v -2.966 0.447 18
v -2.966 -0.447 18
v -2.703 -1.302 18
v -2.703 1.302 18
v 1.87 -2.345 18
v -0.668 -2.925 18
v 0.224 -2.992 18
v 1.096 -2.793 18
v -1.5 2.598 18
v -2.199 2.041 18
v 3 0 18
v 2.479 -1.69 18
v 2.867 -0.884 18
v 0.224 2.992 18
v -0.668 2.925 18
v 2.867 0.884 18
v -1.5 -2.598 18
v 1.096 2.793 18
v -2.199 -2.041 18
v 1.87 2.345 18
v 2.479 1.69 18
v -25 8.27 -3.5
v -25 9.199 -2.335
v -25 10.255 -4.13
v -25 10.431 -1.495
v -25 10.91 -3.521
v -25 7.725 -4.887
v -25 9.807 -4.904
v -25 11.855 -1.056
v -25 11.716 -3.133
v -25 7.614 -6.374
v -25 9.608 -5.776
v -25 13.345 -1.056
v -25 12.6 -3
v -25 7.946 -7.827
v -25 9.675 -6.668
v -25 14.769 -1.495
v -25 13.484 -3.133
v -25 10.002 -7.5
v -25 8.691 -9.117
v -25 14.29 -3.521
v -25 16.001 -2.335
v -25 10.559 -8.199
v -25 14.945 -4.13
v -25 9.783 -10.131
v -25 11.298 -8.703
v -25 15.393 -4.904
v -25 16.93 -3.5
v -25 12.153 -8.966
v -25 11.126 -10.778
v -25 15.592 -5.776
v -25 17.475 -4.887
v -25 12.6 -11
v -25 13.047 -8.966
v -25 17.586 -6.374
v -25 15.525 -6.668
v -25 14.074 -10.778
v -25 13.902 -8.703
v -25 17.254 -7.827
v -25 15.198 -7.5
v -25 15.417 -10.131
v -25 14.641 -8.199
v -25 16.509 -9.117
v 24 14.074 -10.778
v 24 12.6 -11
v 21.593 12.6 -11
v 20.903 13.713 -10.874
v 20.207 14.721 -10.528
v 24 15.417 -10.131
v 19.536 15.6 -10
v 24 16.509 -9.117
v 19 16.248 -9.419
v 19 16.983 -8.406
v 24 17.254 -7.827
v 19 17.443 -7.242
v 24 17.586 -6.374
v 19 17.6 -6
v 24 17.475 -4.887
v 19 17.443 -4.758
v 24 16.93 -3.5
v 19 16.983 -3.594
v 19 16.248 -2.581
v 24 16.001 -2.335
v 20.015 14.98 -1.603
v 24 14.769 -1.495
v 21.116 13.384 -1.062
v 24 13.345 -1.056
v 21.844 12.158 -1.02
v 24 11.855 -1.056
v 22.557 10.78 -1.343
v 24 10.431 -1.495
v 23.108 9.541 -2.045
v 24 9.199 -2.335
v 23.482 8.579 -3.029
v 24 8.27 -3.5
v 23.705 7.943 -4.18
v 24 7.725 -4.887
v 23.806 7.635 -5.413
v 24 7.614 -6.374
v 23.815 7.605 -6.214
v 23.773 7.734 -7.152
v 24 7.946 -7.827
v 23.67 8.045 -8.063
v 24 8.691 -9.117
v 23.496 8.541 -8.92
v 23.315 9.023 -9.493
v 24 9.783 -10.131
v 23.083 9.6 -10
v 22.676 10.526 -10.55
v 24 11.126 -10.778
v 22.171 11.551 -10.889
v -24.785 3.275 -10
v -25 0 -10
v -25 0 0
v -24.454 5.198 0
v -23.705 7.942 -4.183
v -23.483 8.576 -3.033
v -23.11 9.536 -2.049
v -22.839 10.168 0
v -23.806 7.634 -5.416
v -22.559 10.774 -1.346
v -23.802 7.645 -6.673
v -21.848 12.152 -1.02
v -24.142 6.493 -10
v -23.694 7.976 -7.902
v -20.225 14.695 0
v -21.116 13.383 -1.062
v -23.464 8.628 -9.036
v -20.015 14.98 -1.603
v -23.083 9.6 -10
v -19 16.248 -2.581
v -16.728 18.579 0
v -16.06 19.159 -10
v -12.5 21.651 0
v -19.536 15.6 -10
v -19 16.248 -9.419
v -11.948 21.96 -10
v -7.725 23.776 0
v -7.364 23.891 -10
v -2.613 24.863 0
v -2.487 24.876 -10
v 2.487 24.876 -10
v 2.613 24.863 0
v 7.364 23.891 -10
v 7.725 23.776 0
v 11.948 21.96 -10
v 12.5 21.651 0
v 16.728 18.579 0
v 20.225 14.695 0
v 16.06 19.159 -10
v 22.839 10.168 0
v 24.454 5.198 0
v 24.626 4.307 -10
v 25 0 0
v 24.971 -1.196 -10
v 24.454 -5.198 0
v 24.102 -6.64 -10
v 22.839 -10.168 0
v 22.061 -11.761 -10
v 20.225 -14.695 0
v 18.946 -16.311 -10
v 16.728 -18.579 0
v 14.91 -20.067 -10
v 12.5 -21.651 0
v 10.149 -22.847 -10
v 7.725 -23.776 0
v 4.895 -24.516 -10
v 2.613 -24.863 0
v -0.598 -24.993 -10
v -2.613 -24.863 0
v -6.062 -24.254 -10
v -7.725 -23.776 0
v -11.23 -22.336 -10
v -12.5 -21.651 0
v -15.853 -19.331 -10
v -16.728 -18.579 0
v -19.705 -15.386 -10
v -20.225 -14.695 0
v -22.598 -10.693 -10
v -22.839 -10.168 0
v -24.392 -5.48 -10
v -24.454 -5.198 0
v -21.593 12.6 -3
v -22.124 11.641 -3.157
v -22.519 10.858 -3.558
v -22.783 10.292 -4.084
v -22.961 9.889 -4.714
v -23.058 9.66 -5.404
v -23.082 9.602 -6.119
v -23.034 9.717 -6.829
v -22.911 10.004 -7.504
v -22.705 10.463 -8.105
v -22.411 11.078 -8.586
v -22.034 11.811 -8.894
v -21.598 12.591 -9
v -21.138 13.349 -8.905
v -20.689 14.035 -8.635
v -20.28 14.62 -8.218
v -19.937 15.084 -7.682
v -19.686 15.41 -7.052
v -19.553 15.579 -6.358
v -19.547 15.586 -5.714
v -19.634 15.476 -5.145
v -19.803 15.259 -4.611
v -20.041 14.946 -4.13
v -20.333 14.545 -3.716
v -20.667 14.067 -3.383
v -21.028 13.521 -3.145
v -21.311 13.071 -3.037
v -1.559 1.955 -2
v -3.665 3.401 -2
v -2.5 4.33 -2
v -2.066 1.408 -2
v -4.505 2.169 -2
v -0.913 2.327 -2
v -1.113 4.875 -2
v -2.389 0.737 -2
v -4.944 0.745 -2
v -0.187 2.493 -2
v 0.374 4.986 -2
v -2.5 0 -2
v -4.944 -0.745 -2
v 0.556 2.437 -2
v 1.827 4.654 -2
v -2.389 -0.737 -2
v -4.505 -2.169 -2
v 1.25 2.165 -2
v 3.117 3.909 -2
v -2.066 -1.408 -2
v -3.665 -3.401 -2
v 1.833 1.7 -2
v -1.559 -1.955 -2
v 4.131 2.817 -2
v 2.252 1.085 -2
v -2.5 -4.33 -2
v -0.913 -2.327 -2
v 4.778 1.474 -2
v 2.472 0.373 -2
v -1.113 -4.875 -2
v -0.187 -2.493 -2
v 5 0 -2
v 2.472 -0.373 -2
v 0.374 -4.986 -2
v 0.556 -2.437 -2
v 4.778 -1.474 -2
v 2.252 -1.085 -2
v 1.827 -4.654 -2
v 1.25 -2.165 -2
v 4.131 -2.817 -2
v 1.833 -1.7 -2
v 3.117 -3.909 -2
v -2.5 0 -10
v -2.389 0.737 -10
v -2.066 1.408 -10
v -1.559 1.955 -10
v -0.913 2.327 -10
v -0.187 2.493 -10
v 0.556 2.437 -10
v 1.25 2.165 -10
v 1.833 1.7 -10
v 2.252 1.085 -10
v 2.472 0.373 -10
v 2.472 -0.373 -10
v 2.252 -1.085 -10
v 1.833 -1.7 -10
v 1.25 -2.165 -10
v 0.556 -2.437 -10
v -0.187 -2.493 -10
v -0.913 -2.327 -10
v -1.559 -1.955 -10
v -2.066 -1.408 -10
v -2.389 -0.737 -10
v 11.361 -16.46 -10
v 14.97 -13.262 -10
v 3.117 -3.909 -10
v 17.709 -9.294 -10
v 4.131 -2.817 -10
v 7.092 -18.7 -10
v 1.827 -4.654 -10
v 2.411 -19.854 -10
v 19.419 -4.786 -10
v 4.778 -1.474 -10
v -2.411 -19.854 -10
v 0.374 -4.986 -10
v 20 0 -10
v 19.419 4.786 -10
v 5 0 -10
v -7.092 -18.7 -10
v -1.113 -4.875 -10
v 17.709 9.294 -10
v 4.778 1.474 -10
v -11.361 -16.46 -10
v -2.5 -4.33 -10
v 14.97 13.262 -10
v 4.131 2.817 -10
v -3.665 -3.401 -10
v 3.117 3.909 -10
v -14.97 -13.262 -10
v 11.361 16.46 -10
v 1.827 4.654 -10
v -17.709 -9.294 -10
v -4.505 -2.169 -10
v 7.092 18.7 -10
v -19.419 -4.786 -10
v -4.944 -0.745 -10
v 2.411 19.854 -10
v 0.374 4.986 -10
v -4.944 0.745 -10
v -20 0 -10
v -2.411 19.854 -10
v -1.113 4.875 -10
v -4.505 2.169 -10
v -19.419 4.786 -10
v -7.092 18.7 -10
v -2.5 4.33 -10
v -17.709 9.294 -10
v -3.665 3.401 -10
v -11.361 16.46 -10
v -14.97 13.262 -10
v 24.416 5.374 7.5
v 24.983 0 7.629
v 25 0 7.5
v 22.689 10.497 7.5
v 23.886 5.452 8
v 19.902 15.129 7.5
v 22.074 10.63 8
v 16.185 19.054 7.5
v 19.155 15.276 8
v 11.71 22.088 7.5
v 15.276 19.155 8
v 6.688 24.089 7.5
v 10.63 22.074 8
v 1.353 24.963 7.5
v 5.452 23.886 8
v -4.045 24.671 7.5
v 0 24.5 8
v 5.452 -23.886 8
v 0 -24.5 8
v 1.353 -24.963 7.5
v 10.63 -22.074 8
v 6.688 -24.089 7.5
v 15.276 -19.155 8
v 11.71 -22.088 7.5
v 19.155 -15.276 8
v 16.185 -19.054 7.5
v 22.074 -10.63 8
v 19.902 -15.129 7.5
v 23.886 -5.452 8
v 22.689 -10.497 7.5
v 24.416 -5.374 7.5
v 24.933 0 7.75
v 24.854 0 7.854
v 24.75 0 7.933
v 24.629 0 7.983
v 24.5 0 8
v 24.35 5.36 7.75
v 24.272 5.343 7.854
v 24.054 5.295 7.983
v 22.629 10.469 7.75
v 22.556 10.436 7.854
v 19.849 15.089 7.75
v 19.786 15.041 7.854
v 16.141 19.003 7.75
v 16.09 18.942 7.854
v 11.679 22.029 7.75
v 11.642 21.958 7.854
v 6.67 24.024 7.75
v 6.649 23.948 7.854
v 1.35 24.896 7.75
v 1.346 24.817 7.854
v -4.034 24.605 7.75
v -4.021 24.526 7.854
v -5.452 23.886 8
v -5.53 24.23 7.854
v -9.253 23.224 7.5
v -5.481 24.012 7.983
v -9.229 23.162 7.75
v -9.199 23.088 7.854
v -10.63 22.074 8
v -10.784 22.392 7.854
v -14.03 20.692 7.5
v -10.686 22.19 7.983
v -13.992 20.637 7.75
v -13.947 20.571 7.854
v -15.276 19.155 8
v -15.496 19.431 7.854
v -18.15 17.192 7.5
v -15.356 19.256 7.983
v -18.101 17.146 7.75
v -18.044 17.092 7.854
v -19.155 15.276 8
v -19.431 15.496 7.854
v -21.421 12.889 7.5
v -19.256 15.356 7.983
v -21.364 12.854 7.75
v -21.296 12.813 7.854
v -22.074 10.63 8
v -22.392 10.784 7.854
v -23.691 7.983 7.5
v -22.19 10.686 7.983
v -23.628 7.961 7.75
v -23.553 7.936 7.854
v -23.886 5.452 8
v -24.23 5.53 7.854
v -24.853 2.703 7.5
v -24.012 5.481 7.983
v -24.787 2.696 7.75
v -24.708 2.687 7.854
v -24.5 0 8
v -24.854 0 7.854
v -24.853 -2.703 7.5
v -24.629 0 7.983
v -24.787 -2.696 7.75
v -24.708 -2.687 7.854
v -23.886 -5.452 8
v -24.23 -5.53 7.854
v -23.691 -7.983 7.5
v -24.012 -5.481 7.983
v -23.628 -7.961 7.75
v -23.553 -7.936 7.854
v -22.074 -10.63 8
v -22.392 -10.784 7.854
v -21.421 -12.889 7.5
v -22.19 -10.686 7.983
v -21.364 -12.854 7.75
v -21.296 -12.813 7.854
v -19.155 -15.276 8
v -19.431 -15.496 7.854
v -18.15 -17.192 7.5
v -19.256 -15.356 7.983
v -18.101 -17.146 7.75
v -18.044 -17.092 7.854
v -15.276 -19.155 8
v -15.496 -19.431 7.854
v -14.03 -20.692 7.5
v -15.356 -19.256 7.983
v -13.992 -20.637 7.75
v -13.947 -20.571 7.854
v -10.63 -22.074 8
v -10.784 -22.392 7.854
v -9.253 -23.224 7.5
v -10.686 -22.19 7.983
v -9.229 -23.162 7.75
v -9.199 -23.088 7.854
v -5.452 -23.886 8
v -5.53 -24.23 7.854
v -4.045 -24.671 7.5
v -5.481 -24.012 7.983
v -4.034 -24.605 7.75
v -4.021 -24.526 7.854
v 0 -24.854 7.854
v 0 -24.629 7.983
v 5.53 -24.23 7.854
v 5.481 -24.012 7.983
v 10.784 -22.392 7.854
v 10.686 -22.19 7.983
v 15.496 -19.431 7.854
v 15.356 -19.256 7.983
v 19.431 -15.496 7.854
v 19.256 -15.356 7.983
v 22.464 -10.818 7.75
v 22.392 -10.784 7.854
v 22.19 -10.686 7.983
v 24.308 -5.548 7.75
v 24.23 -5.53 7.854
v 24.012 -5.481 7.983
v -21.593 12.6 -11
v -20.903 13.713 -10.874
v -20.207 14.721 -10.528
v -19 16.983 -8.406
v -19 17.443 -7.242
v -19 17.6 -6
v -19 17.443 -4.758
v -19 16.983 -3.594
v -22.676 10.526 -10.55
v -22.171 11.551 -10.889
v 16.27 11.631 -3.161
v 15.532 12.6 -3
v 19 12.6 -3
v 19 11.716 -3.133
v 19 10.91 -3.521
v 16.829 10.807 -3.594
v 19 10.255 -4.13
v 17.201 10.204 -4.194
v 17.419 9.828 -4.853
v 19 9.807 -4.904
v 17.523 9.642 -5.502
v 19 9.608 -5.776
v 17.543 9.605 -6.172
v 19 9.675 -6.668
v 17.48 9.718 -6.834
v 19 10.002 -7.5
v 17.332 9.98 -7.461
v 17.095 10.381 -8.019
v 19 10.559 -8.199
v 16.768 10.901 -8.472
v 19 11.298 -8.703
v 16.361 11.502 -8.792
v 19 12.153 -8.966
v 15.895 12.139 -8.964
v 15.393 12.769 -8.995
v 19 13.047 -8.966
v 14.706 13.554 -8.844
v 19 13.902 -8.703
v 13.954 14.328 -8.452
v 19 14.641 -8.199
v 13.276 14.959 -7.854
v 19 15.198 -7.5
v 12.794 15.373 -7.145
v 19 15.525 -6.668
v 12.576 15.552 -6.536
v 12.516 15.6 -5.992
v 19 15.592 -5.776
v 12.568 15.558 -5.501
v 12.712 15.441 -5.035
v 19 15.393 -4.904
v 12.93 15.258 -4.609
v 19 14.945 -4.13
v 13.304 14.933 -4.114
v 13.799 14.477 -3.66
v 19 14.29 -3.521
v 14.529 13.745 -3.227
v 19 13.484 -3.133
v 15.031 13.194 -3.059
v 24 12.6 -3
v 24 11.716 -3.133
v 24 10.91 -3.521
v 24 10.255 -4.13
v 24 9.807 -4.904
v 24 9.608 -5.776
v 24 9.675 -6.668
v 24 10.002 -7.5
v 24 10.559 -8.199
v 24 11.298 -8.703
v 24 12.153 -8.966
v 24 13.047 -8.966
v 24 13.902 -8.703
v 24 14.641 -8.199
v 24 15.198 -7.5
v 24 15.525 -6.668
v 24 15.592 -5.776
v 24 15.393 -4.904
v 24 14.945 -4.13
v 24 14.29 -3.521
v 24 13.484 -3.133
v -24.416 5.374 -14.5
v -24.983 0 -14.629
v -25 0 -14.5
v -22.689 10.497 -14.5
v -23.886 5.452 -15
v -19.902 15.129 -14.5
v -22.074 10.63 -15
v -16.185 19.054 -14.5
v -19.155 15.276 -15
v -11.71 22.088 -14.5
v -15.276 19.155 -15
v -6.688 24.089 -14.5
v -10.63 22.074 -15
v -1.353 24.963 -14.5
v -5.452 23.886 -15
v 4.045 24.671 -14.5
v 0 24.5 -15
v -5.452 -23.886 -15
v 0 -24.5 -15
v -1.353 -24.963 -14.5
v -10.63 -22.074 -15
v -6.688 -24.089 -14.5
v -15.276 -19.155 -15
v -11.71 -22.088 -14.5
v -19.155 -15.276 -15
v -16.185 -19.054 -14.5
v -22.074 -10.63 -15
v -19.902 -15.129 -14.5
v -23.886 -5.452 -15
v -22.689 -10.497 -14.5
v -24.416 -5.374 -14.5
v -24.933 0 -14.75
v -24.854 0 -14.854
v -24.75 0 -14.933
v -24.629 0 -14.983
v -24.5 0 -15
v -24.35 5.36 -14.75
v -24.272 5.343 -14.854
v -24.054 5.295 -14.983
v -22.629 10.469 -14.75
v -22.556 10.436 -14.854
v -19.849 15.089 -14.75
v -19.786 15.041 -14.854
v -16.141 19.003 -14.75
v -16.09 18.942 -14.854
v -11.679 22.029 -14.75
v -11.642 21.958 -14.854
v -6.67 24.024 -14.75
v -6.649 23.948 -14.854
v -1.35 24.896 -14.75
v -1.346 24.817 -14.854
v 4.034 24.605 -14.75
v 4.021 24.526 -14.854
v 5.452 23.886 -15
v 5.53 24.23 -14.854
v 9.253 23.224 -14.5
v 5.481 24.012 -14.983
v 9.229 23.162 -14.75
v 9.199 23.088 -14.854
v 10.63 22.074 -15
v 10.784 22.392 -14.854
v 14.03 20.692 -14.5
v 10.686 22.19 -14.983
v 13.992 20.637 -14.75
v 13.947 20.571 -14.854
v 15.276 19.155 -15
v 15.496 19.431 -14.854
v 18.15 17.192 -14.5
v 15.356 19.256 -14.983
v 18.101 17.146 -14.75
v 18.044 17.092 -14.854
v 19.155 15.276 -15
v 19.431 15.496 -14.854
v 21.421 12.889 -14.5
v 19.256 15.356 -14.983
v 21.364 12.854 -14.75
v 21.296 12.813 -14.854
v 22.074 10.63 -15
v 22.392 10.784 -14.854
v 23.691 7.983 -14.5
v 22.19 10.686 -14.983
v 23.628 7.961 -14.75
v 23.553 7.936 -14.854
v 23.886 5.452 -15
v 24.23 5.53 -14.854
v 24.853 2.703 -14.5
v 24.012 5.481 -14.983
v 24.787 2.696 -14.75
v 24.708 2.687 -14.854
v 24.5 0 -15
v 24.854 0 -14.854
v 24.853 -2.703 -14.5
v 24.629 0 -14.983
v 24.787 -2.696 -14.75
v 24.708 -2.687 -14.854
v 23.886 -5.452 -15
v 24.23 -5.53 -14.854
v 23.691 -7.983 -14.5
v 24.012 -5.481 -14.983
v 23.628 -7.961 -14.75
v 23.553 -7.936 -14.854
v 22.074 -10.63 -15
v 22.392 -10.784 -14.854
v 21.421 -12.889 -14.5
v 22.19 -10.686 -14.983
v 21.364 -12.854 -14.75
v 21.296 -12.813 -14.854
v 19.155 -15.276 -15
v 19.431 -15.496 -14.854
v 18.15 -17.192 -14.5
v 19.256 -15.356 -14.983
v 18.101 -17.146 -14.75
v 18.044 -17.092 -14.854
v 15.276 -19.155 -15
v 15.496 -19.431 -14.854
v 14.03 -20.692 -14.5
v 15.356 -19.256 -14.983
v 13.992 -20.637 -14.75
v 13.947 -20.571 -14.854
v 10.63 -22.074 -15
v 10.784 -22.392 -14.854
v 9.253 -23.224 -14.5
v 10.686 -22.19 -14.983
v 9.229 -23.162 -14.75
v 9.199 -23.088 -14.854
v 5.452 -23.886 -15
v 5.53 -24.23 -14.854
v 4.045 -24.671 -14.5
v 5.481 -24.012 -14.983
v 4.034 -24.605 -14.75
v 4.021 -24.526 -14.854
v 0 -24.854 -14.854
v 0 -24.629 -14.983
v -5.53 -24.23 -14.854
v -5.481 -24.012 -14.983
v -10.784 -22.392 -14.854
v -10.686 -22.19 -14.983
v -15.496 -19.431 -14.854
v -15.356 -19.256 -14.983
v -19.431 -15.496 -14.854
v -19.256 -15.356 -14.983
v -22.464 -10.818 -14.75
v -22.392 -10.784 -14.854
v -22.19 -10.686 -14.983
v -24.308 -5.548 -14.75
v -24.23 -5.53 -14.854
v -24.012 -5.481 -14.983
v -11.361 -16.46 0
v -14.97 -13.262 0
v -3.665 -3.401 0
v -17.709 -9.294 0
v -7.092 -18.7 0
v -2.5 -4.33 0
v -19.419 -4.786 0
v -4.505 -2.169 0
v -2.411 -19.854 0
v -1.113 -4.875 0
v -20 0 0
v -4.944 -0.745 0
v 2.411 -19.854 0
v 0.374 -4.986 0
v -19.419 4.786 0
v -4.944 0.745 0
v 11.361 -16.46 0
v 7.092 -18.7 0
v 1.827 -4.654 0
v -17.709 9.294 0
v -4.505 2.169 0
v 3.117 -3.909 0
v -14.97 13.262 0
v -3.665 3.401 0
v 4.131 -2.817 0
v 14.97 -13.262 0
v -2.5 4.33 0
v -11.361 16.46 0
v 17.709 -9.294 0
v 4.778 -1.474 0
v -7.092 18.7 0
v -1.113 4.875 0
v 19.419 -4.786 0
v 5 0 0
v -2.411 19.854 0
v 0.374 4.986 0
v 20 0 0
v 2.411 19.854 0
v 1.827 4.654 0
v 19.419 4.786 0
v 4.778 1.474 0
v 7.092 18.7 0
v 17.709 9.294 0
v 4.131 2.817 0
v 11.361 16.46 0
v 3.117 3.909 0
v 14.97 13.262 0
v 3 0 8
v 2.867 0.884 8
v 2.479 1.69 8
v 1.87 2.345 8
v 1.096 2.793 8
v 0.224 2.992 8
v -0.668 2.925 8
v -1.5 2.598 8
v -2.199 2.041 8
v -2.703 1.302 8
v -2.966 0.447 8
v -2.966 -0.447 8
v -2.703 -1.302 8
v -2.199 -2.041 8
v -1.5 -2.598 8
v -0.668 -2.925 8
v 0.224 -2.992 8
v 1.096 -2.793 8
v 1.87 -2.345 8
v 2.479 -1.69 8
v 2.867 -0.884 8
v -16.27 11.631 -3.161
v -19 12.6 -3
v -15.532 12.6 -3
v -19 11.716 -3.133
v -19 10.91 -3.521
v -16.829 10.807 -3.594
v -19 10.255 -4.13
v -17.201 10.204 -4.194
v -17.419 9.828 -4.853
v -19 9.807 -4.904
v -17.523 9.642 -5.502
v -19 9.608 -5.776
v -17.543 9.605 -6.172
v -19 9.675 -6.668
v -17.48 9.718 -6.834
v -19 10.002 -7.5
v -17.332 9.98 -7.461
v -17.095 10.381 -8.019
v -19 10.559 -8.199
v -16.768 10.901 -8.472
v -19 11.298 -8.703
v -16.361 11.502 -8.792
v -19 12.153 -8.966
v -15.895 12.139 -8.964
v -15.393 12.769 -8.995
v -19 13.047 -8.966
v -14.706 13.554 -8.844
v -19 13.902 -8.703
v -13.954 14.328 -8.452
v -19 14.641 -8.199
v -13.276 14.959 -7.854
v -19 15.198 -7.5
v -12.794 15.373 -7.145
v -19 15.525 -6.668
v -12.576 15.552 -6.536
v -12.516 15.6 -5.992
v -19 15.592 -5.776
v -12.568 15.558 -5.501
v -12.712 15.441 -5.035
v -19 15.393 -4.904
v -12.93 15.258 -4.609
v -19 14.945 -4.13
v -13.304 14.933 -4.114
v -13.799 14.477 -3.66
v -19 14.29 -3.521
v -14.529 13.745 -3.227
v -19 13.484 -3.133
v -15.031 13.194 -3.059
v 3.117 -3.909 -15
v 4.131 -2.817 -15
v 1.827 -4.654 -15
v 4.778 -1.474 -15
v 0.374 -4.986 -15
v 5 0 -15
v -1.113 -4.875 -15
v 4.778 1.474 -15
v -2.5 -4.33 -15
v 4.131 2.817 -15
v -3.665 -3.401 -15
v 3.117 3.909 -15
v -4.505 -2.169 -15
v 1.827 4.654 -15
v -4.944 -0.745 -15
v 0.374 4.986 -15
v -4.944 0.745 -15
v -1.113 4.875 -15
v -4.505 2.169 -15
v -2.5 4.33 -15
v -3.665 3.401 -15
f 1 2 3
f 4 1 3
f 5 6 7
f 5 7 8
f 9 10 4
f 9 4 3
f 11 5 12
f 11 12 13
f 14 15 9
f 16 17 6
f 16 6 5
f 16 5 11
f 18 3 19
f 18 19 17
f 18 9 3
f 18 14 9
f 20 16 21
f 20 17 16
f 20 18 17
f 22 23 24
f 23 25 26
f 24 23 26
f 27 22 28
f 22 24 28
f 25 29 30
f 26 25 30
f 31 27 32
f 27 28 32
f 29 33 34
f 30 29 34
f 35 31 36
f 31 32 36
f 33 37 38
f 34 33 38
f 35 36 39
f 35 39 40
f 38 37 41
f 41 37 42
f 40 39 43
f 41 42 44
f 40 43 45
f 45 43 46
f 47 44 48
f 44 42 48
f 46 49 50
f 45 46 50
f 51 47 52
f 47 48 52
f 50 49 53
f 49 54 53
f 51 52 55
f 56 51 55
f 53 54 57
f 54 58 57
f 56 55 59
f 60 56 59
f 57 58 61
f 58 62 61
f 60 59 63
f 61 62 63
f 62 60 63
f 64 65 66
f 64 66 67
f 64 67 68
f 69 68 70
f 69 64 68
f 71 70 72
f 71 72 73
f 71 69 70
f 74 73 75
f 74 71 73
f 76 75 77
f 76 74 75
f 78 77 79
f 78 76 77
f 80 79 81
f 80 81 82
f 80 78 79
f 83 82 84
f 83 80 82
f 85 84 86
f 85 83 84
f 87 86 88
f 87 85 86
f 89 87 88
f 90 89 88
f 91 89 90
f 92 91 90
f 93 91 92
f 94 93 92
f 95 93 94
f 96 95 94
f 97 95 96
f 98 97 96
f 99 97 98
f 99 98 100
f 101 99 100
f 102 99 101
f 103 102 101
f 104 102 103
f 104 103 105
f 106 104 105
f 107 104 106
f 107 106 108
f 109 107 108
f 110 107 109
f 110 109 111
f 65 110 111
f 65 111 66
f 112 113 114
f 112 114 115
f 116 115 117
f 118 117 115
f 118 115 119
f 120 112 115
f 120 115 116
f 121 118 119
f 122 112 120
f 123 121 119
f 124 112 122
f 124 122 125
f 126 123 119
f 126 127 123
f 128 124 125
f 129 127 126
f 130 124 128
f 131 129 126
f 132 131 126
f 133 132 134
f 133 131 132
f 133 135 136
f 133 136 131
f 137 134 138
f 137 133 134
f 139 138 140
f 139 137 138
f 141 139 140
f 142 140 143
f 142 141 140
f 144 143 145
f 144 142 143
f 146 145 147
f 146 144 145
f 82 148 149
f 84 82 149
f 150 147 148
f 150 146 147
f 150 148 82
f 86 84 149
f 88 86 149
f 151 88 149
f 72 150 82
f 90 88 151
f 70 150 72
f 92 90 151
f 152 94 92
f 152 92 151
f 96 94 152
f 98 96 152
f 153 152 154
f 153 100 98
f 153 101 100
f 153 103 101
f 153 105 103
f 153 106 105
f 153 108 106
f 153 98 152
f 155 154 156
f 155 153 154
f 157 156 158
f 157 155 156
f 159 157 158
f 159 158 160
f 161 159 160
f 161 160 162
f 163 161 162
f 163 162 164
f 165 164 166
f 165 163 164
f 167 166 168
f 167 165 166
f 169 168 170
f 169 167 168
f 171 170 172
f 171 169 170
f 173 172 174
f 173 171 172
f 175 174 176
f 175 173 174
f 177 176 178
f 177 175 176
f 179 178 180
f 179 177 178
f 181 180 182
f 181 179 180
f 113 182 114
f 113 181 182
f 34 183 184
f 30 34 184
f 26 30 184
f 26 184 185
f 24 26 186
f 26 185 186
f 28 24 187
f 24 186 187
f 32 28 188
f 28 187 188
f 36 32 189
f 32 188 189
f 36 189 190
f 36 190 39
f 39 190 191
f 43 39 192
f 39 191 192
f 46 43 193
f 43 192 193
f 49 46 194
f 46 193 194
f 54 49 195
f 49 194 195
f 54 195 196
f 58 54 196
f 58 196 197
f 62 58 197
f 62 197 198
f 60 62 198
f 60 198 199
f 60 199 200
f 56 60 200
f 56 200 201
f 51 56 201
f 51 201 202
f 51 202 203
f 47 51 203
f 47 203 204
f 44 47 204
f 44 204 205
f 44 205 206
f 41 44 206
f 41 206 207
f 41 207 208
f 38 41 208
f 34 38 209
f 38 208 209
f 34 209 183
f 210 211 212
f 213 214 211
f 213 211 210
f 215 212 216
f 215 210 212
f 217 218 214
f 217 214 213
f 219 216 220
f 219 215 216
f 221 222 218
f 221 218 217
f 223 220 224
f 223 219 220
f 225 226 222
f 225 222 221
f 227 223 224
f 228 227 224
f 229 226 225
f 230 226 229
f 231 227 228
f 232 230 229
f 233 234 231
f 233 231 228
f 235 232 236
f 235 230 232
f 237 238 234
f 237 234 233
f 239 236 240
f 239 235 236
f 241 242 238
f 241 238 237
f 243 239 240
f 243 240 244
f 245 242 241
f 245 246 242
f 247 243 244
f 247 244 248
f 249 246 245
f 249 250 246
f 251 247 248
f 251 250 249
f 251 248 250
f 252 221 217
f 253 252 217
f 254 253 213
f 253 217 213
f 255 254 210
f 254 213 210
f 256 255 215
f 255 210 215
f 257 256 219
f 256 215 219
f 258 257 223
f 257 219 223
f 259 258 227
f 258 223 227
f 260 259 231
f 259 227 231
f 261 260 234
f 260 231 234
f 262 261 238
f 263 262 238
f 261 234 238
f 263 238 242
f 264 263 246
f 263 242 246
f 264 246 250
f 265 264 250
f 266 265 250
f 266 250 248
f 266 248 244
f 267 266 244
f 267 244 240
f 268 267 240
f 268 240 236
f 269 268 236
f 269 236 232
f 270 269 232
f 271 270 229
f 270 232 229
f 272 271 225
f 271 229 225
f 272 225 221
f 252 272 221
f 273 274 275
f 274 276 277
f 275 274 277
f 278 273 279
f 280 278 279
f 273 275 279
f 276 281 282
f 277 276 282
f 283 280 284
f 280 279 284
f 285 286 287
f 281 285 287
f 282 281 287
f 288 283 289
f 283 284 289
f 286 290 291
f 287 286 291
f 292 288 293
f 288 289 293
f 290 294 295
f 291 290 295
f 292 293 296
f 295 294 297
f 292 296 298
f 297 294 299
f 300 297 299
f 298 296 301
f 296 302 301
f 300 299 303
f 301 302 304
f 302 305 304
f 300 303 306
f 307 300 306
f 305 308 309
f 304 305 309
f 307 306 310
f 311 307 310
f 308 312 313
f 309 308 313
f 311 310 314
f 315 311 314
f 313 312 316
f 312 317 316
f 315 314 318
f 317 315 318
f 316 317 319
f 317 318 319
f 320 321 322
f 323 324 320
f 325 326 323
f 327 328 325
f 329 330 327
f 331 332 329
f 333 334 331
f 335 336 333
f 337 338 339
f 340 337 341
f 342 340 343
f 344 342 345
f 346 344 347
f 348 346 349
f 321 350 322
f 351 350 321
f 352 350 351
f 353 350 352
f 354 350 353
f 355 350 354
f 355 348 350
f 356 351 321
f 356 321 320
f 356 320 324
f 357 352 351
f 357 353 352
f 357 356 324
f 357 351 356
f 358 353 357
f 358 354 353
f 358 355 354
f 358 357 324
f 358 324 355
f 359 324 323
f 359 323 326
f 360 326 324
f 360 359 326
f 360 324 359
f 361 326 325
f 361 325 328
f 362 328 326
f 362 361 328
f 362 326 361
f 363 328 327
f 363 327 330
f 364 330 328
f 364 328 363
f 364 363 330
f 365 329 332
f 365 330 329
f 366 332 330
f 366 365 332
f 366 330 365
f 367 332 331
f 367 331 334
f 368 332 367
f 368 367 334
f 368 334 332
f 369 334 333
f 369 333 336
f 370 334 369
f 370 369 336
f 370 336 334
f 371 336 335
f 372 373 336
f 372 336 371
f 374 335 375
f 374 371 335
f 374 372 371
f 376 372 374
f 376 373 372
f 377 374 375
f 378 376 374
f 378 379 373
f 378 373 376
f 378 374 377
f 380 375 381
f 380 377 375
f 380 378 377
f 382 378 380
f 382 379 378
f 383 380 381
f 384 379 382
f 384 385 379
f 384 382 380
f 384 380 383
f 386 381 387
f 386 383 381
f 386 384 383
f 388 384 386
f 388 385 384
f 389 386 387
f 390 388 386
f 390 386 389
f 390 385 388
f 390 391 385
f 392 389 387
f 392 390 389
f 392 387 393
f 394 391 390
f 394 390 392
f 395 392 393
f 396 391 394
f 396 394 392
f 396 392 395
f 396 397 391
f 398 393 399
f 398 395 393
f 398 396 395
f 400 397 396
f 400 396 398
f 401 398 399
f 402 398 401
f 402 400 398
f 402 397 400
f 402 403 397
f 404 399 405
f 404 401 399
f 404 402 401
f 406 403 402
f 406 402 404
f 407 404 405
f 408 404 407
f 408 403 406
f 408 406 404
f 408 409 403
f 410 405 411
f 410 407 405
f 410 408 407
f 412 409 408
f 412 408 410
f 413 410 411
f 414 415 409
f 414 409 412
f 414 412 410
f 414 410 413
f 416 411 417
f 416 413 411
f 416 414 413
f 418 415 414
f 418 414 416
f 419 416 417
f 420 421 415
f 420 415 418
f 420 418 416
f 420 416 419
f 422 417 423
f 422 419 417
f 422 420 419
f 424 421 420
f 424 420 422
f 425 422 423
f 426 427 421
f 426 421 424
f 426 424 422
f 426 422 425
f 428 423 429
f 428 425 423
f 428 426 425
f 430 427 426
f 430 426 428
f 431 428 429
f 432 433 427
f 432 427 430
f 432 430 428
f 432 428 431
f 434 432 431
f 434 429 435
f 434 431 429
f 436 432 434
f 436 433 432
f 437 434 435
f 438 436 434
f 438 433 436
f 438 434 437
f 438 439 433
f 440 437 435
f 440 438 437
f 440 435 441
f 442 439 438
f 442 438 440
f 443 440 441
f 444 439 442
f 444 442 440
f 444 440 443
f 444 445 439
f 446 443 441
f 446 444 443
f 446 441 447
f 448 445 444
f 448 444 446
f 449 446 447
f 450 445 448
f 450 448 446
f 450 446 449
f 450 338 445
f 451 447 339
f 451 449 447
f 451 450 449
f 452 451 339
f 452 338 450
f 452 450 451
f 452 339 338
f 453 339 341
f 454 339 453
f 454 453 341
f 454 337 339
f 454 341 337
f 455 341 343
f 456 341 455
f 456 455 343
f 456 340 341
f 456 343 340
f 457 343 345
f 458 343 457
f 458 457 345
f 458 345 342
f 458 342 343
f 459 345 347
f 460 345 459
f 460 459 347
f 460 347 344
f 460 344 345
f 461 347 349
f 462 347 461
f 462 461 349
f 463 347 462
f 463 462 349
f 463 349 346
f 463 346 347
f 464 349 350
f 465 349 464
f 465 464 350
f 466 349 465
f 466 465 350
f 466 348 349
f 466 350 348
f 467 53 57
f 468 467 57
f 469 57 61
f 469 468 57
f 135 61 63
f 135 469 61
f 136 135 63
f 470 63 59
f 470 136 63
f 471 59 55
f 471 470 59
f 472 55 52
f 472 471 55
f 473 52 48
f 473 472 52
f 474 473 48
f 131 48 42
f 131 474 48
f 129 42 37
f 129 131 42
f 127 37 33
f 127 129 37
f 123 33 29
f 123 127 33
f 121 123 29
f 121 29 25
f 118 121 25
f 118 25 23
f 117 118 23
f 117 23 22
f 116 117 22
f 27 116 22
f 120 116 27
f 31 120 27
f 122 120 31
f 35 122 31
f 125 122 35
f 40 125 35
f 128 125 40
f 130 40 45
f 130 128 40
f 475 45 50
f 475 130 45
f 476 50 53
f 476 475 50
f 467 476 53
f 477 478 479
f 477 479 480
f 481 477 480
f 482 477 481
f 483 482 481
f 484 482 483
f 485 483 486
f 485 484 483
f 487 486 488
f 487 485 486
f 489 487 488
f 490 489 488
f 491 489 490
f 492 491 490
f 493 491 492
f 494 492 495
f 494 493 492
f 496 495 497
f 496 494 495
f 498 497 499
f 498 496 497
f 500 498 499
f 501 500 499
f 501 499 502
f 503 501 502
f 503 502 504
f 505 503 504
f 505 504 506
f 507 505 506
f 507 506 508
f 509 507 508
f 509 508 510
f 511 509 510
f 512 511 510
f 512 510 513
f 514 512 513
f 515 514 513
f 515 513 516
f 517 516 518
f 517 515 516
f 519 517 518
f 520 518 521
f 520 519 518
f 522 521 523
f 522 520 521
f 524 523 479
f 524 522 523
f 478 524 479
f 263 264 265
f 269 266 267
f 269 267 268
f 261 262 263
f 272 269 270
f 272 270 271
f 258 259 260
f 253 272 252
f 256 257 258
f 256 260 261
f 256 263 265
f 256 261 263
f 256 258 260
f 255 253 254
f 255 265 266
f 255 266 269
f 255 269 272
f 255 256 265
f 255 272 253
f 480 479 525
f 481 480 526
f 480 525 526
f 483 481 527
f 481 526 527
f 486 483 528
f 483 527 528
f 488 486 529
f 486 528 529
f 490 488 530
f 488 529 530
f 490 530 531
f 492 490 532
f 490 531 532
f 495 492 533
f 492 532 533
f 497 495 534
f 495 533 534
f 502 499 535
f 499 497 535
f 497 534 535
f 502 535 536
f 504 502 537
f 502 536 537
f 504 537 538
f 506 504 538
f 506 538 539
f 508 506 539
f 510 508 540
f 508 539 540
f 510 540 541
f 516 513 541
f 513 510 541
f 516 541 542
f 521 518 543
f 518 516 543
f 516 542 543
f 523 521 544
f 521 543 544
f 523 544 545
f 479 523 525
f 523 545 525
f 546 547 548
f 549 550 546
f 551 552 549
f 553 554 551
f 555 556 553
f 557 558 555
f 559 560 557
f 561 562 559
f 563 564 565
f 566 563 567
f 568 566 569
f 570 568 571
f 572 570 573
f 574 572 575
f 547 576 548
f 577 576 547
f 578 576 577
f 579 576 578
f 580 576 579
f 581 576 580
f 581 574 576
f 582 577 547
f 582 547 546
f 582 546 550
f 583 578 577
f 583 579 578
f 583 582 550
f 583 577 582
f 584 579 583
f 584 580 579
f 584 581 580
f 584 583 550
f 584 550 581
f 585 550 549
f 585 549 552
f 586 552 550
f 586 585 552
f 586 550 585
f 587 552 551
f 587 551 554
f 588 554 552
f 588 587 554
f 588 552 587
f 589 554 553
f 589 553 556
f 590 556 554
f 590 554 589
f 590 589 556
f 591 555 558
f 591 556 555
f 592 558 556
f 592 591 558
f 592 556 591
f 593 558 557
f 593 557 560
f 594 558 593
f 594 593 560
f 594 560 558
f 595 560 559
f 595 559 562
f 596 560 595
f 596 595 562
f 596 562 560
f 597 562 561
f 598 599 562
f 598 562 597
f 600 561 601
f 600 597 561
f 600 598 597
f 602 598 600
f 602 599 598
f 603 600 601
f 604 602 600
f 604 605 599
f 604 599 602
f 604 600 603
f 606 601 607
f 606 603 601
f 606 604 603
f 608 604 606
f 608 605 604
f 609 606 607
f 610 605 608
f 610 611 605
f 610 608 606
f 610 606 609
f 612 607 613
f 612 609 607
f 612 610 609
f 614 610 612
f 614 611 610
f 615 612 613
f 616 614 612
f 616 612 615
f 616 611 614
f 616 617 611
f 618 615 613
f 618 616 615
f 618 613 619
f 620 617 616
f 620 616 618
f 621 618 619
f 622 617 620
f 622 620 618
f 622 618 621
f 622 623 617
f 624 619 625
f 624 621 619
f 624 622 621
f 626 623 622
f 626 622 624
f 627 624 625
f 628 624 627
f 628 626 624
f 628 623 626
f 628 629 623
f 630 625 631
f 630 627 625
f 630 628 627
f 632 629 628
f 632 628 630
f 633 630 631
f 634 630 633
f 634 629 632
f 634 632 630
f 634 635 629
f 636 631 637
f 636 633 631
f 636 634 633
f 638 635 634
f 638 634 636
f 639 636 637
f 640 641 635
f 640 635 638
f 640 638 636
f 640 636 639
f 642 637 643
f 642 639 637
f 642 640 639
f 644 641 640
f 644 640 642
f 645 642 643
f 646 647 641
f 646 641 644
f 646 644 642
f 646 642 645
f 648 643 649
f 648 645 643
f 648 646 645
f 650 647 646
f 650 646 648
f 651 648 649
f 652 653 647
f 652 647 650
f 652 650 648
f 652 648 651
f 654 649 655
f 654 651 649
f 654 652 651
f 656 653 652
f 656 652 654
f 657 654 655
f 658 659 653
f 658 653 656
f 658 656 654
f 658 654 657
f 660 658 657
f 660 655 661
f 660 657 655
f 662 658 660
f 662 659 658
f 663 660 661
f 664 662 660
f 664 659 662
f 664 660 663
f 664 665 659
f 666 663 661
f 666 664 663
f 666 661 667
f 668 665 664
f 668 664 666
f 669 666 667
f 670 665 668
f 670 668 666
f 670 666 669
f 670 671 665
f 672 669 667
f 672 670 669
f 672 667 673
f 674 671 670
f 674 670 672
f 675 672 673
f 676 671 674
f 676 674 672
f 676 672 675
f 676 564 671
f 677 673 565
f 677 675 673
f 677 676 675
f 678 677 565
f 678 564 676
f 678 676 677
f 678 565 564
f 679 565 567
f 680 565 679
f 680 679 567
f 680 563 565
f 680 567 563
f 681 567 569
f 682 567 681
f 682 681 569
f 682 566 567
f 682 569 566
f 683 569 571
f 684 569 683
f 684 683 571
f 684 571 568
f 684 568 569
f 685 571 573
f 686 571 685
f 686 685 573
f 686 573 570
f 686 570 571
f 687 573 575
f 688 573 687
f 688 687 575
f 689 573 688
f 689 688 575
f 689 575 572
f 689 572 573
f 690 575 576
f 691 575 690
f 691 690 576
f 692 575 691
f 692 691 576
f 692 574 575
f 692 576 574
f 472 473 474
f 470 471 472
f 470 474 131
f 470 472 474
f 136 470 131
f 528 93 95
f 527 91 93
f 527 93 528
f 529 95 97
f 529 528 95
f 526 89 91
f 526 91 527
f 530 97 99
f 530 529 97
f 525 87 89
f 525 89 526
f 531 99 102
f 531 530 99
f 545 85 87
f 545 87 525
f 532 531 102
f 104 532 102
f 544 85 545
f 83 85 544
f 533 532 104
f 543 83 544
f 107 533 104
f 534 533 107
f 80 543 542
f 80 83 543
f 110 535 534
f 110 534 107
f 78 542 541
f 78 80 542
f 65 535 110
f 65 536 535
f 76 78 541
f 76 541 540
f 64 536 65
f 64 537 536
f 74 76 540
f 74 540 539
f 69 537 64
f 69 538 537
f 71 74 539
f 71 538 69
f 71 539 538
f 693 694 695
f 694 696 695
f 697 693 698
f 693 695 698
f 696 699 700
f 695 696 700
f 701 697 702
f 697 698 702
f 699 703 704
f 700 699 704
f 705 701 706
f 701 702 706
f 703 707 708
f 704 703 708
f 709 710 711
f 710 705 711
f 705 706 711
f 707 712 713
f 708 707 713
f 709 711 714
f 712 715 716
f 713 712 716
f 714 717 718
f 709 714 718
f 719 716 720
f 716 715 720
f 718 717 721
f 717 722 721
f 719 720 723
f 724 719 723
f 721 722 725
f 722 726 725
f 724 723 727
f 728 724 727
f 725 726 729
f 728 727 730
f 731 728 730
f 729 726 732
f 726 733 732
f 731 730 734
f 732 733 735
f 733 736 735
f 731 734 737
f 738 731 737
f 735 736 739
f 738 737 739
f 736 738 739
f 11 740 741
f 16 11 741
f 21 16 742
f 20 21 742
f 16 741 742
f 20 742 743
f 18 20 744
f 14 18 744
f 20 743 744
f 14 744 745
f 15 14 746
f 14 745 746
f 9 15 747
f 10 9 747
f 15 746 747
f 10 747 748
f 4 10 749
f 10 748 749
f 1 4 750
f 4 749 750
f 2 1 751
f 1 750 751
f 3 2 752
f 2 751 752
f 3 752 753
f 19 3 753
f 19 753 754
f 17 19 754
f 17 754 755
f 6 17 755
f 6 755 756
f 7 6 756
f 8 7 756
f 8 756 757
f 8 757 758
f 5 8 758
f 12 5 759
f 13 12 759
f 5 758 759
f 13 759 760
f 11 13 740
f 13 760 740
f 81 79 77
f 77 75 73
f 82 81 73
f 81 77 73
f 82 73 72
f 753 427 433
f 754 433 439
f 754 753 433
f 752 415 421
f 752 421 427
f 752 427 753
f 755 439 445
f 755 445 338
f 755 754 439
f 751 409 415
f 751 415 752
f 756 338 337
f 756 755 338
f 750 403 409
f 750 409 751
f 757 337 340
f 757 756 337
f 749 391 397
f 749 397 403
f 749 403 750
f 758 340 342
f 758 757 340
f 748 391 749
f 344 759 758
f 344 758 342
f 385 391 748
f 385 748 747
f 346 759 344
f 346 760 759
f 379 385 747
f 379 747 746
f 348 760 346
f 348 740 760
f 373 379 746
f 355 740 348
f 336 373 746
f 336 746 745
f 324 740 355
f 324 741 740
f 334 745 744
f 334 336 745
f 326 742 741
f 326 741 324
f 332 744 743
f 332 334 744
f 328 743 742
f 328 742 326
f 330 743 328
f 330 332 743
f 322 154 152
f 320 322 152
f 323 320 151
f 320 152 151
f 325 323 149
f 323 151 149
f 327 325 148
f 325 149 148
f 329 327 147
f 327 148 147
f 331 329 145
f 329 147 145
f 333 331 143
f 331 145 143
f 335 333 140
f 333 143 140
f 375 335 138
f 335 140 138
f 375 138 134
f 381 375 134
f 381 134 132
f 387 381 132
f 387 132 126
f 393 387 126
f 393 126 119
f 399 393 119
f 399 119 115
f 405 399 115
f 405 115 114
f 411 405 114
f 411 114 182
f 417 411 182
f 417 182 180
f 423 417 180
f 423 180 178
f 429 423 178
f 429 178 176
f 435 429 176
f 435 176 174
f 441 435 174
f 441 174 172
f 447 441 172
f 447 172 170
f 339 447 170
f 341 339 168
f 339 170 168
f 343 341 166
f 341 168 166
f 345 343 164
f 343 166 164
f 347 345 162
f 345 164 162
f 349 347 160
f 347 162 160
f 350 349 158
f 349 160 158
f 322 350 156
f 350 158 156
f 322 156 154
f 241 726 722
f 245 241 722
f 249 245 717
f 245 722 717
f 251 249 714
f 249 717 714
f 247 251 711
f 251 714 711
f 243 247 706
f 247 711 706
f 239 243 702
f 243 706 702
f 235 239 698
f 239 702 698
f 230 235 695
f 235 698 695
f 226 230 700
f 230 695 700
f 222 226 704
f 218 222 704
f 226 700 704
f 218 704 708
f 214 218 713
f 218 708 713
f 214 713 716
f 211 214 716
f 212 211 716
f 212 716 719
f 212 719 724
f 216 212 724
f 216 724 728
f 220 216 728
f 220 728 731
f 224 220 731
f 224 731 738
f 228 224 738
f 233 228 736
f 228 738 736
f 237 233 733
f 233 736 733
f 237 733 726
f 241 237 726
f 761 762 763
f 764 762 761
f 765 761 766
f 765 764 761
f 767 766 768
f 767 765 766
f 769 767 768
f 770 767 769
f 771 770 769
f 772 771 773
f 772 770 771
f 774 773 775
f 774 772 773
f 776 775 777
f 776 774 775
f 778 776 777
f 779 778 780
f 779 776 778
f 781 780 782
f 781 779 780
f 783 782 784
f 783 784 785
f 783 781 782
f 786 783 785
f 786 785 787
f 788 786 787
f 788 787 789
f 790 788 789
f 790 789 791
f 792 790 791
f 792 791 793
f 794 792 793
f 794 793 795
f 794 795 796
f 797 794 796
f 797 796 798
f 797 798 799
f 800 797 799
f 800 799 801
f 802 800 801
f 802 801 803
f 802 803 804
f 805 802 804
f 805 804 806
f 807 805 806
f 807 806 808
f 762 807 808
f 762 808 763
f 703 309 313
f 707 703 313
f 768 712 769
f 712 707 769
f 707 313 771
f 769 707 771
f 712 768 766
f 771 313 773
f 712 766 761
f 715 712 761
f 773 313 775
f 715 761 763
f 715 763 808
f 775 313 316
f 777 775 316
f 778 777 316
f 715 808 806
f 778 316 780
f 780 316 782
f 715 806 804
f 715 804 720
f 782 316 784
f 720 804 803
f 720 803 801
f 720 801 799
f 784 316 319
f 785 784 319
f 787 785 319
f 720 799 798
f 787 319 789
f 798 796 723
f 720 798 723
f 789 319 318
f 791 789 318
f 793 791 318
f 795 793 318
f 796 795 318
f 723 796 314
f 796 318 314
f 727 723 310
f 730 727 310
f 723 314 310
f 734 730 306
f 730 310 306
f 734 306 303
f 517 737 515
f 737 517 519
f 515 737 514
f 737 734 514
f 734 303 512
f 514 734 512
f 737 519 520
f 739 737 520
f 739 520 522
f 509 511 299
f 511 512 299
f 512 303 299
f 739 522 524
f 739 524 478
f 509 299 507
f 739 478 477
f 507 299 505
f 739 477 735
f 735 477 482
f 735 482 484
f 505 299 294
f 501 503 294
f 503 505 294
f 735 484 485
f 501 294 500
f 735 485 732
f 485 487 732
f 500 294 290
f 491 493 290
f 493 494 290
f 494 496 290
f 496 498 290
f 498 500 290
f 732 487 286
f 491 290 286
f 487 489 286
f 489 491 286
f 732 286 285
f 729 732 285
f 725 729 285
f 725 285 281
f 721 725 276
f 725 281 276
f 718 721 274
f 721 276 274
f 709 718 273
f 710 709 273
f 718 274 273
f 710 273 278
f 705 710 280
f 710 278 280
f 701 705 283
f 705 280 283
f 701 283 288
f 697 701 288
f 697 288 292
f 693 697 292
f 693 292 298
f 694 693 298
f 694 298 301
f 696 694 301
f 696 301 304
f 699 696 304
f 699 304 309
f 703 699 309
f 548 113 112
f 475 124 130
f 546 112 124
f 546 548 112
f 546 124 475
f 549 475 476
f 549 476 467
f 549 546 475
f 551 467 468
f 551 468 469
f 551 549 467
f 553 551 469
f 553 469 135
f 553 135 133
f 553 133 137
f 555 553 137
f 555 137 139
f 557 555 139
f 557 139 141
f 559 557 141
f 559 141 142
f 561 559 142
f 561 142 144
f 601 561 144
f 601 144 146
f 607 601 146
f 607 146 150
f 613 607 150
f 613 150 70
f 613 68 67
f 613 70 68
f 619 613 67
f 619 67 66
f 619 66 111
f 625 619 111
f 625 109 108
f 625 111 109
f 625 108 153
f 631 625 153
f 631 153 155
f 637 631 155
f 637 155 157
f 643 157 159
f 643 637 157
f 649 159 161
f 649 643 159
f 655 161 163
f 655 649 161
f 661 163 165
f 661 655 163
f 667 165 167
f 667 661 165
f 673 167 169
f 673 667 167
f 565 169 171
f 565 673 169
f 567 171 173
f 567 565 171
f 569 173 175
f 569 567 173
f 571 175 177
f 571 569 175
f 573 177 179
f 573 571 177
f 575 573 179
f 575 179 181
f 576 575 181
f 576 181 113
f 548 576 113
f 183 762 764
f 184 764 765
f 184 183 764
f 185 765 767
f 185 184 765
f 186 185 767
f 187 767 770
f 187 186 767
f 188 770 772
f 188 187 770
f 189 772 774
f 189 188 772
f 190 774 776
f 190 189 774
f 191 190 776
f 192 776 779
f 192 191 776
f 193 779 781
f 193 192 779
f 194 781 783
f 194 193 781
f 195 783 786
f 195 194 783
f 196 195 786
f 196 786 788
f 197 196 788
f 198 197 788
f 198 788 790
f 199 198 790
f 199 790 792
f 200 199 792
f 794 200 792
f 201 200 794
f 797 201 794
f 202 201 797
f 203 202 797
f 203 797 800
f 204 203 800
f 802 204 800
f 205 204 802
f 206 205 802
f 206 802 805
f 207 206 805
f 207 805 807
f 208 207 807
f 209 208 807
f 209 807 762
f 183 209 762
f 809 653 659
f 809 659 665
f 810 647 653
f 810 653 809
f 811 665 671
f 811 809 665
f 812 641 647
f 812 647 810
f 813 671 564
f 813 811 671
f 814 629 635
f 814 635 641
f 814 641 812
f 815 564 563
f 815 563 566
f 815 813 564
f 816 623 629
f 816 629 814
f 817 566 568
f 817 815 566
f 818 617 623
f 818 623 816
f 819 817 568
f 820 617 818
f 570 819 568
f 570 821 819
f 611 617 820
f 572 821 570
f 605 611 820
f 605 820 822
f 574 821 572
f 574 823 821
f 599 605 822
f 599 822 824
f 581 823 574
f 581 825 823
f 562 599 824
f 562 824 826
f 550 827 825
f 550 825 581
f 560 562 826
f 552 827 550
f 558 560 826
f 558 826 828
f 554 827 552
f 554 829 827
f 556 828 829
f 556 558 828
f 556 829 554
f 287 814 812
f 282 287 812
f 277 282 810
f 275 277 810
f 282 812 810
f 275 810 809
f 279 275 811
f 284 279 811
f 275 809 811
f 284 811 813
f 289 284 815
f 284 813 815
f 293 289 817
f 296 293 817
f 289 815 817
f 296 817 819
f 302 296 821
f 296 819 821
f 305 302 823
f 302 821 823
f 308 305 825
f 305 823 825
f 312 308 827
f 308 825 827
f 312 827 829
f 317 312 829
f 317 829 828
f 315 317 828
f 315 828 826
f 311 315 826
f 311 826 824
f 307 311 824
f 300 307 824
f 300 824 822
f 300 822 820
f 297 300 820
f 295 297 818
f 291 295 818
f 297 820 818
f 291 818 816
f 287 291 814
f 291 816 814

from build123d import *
from build123d.topology import SkipClean

# Parameters (mm, degrees)
SKETCH_1_R               = 25
EXTRUDE_1_DEPTH          = 8
SKETCH_2_R               = 3
EXTRUDE_2_DEPTH          = 10
EXTRUDE_START            = 10
SKETCH_3_R               = 25
SKETCH_3_R_2             = 20
EXTRUDE_3_DEPTH          = 10
SKETCH_4_R               = 5
EXTRUDE_4_DEPTH          = 2
SKETCH_5_R               = 2.5
EXTRUDE_5_DEPTH          = 8
EXTRUDE_START_2          = 5
SKETCH_6_R               = 25
SKETCH_6_R_2             = 5
EXTRUDE_6_DEPTH          = 5
CUT_EXTRUDE_1_DEPTH      = 40.67366885
CUT_EXTRUDE_1_DEPTH_BACK = 40.67366885
SKETCH_8_R               = 3
SKETCH_9_R               = 5
SKETCH_9_R_2             = 3
EXTRUDE_7_DEPTH          = 6
SKETCH_10_R              = 5
EXTRUDE_8_DEPTH          = 5
SKETCH_11_R              = 3
CUT_EXTRUDE_2_DEPTH      = 5
FILLET_1_R               = 0.5


with BuildPart() as part:
    # 草图1 → 凸台-拉伸1 (new body)
    with BuildSketch(Plane.XY):
        Circle(SKETCH_1_R)
    extrude(amount=EXTRUDE_1_DEPTH)

    # 草图2 → 凸台-拉伸2 (add)
    with BuildSketch(Plane.XY.offset(8)):
        Circle(SKETCH_2_R)
    extrude(amount=EXTRUDE_2_DEPTH)

    # 草图3 → 凸台-拉伸3 (add)
    with BuildSketch(Plane(origin=(0, 0, 0), x_dir=(-1, 0, 0), z_dir=(0, 0, -1)).offset(EXTRUDE_START)):
        Circle(SKETCH_3_R)
        Circle(SKETCH_3_R_2, mode=Mode.SUBTRACT)
    extrude(amount=-EXTRUDE_3_DEPTH)

    # 草图4 → 凸台-拉伸4 (add)
    with BuildSketch(Plane(origin=(0, 0, 0), x_dir=(-1, 0, 0), z_dir=(0, 0, -1))):
        with Locations(Location((0, 0, 0), (0, 0, 180))):
            Circle(SKETCH_4_R)
    extrude(amount=EXTRUDE_4_DEPTH)

    # 草图5 → 凸台-拉伸5 (add)
    with BuildSketch(Plane(origin=(0, 0, -2), x_dir=(-1, 0, 0), z_dir=(0, 0, -1))):
        Circle(SKETCH_5_R)
    extrude(amount=EXTRUDE_5_DEPTH)

    # 草图6 → 凸台-拉伸6 (add)
    with BuildSketch(Plane(origin=(0, 0, -10), x_dir=(-1, 0, 0), z_dir=(0, 0, -1)).offset(EXTRUDE_START_2)):
        Circle(SKETCH_6_R)
        with Locations(Location((0, 0, 0), (0, 0, 180))):
            Circle(SKETCH_6_R_2, mode=Mode.SUBTRACT)
    extrude(amount=-EXTRUDE_6_DEPTH)

    # 草图8 → 切除-拉伸1 (cut, two sides: drawn at the far end of the back side and taken through both)
    with BuildSketch(Plane(origin=(0, 0, 0), x_dir=(0, 0, -1), z_dir=(1, 0, 0)).offset(-CUT_EXTRUDE_1_DEPTH_BACK)):
        with Locations(Location((6, 12.6, 0), (0, 0, 180))):
            Circle(SKETCH_8_R)
    extrude(amount=CUT_EXTRUDE_1_DEPTH + CUT_EXTRUDE_1_DEPTH_BACK, mode=Mode.SUBTRACT)

    # 草图9 → 凸台-拉伸7 (add, through all)
    with SkipClean():  # the faces are left unmerged after this step: merging them gives an invalid solid
        with BuildSketch(Plane(origin=(-19, 0, 0), x_dir=(0, 0, -1), z_dir=(1, 0, 0))):
            with Locations((6, 12.6)):
                Circle(SKETCH_9_R)
            with Locations(Location((6, 12.6, 0), (0, 0, 180))):
                Circle(SKETCH_9_R_2, mode=Mode.SUBTRACT)
        extrude(amount=-EXTRUDE_7_DEPTH)

    # 草图10 → 凸台-拉伸8 (add)
    with BuildSketch(Plane(origin=(19, 0, 0), x_dir=(0, 0, -1), z_dir=(1, 0, 0)).offset(EXTRUDE_START_2)):
        with Locations((6, 12.6)):
            Circle(SKETCH_10_R)
    extrude(amount=-EXTRUDE_8_DEPTH)

    # 草图11 → 切除-拉伸2 (cut)
    with BuildSketch(Plane(origin=(24, 0, 0), x_dir=(0, 0, -1), z_dir=(1, 0, 0))):
        with Locations(Location((6, 12.6, 0), (0, 0, 180))):
            Circle(SKETCH_11_R)
    extrude(amount=-CUT_EXTRUDE_2_DEPTH, mode=Mode.SUBTRACT)

    # 圆角1
    fillet_1_edges = [part.edges().sort_by_distance(p)[0] for p in [
        (25, 0, -15),
        (-25, 0, 8),
    ]]
    fillet(fillet_1_edges, radius=FILLET_1_R)


solid = part.part
